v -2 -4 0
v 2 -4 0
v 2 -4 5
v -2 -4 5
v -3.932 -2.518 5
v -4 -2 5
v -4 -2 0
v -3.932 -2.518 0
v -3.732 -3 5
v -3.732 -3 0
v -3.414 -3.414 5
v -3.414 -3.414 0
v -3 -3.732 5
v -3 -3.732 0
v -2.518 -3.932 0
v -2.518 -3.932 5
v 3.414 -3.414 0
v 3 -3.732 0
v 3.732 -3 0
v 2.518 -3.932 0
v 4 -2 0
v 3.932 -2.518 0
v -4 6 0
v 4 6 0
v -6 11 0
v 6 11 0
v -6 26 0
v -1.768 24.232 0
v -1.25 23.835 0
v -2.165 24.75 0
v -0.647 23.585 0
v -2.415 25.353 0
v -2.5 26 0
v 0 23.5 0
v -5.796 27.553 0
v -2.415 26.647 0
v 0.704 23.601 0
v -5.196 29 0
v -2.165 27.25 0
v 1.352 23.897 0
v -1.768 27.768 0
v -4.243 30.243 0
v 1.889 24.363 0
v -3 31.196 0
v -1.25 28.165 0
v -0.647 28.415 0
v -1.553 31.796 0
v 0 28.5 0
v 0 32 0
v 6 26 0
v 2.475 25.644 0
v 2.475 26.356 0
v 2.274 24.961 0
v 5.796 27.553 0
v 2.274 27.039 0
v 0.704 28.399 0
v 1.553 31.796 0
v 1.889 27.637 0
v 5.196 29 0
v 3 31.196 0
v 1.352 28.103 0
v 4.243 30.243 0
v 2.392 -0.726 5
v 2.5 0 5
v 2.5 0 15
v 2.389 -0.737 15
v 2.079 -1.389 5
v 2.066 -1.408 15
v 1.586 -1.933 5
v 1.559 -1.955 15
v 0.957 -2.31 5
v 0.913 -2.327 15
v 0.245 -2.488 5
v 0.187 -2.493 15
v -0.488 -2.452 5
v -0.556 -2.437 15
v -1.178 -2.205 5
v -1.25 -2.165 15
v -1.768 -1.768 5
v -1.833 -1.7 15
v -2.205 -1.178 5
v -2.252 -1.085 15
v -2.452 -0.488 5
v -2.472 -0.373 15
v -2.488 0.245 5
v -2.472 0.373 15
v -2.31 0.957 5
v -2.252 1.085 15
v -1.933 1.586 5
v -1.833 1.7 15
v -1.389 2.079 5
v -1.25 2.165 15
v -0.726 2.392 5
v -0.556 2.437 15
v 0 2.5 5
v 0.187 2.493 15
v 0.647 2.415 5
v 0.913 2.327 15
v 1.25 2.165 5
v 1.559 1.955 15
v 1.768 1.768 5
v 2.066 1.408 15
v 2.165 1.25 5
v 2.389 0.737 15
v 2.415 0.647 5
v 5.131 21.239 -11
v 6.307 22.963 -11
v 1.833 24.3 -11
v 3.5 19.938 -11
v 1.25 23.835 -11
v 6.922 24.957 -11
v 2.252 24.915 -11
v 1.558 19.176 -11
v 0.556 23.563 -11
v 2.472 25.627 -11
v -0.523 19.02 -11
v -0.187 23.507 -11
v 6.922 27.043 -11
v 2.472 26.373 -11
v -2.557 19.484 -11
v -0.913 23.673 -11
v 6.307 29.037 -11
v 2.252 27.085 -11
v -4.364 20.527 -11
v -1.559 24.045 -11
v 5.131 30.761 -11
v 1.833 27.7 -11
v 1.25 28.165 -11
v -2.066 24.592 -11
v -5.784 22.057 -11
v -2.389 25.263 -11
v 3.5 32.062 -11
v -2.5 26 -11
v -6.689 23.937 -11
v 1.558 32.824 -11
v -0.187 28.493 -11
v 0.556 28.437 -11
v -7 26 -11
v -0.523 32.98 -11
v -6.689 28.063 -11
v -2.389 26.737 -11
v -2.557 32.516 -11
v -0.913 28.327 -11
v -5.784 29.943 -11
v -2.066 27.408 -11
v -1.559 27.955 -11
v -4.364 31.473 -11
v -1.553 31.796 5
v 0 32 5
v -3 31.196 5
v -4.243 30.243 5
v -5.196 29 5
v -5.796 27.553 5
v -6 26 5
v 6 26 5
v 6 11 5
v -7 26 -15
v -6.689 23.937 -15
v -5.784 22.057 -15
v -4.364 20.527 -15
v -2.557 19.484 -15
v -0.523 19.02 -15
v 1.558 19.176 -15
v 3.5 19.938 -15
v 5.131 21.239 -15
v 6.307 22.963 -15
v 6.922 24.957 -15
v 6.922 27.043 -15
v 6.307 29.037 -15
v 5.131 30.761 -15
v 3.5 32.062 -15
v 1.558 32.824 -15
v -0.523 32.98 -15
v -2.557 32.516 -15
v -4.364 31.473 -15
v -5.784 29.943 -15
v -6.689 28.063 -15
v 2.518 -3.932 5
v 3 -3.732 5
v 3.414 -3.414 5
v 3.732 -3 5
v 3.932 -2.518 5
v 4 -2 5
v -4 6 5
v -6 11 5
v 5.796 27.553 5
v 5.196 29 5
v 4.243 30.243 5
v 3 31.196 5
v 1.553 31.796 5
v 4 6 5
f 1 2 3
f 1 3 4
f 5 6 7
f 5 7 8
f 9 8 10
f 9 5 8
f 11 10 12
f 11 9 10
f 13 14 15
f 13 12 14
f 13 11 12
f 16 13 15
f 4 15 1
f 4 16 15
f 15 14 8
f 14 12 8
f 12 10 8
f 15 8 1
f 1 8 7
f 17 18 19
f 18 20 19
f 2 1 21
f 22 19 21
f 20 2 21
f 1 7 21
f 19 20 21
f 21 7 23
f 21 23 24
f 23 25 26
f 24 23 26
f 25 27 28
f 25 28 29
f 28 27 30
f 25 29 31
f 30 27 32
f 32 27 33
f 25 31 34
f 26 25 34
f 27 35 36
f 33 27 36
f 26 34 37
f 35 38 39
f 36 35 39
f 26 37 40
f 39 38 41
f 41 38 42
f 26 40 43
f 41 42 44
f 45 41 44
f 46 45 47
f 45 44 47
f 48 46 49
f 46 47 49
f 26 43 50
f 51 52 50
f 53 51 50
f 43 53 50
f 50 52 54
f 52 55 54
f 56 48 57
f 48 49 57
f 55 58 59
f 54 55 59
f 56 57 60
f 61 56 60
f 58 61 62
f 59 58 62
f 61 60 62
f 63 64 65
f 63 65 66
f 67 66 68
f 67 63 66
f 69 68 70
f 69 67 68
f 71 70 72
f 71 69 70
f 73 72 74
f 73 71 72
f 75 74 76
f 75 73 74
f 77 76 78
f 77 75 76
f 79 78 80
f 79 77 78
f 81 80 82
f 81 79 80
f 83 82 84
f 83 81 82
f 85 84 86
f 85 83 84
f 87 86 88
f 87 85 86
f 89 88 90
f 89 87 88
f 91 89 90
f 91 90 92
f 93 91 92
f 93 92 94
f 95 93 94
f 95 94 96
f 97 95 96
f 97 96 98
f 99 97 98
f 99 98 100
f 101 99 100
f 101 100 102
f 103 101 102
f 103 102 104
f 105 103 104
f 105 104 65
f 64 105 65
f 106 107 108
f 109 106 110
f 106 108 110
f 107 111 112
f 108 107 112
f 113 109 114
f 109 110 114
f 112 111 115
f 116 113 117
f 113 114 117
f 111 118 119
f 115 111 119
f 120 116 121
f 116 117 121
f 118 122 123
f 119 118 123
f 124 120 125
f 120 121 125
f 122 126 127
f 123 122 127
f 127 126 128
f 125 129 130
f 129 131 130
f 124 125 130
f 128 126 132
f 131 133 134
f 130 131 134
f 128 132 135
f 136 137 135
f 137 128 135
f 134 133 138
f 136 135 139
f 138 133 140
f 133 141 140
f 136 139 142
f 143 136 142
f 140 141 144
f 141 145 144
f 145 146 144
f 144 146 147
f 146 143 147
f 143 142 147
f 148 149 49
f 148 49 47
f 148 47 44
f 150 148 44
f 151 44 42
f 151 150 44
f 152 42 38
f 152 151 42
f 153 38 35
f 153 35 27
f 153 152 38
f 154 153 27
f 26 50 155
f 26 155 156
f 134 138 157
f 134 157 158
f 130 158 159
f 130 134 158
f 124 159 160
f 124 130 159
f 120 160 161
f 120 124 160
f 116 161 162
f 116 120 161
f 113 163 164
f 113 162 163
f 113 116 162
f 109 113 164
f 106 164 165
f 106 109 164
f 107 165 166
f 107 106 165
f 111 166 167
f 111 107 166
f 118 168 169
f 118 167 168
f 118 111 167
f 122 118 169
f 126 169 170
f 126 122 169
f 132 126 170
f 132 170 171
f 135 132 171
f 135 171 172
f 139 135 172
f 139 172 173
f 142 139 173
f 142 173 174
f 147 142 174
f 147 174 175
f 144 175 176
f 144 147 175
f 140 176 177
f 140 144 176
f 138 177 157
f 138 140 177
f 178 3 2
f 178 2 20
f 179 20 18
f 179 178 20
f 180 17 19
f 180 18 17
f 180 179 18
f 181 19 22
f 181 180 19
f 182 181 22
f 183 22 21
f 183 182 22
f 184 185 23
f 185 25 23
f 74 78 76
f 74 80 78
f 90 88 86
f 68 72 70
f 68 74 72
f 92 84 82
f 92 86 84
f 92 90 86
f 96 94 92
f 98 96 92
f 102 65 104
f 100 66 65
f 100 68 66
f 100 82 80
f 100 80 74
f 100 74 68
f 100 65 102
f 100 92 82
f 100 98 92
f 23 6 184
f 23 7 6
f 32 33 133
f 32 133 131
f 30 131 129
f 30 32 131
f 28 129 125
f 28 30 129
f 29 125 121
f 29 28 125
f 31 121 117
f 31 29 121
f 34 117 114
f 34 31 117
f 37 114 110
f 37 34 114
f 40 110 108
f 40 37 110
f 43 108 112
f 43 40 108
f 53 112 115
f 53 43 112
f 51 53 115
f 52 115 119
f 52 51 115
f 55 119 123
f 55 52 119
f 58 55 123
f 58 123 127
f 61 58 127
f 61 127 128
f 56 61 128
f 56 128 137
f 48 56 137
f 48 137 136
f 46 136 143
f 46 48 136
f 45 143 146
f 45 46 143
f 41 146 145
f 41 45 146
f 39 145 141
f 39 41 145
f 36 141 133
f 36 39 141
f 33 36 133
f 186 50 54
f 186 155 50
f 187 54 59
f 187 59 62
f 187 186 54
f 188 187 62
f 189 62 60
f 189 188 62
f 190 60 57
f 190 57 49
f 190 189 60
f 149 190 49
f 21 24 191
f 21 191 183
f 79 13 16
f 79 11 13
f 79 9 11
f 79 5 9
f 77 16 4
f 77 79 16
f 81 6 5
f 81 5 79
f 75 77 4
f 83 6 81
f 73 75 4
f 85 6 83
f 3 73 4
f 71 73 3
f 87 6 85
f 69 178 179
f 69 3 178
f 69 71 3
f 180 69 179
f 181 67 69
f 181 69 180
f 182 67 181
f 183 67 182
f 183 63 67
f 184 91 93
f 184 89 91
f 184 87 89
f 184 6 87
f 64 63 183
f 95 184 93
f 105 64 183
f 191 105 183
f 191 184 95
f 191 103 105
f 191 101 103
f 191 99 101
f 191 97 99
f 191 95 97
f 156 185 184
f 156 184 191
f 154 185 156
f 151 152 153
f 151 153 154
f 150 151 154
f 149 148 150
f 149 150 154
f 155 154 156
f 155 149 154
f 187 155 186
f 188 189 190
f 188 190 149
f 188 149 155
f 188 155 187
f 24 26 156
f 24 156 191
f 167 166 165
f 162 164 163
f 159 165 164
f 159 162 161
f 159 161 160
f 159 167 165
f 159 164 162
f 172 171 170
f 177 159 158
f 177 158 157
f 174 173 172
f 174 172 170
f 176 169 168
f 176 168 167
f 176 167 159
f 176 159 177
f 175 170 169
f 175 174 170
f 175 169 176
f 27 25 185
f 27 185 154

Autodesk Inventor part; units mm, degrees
ref_plane "YZ Plane" through (0, 0, 0) normal (1, 0, 0) x (0, 1, 0)
ref_plane "XZ Plane" through (0, 0, 0) normal (0, 1, 0) x (-1, 0, 0)
ref_plane "XY Plane" through (0, 0, 0) normal (0, 0, 1) x (1, 0, 0)
sketch "스케치1" plane through (0, 0, 0) normal (0, 0, 1) x (1, 0, 0)
  circle A0 centre (0, 0) radius 2.5
  line L0 (0, 0) -> (0, 40)
  line L1 (4, 6) -> (4, -4)
  line L2 (4, -4) -> (-4, -4)
  line L3 (-4, -4) -> (-4, 6)
  line L4 (-6, 32) -> (6, 32)
  line L5 (6, 32) -> (6, 11)
  line L6 (-6, 11) -> (-6, 32)
  line L7 (-6, 11) -> (-4, 6)
  line L8 (6, 11) -> (4, 6)
  dimension "d0" = 5
  dimension "d1" = 40
  dimension "d2" = 8
  dimension "d3" = 4
  dimension "d4" = 4
  dimension "d5" = 36
  dimension "d8" = 12
  dimension "d9" = 6
  dimension "d10" = 10
  dimension "d11" = 5
  dimension "d12" = 5
  dimension "d13" = 10
extrude "돌출1" add sketch "스케치1" along normal blind 5
extrude "돌출2" add sketch "스케치1" along normal blind 15 contours A0
sketch "스케치2" plane through (0, 0, 0) normal (0, 0, -1) x (-1, 0, 0)
  circle A0 centre (0, 26) radius 2.5
  line L0 (-6, 11) -> (-6, 32) projected
  line L1 (4, -4) -> (-4, -4) projected
  point P0 (0, 0)
  dimension "d18" = 5
  dimension "d19" = 6
  dimension "d20" = 30
extrude "돌출3" add sketch "스케치2" along normal blind 11
sketch "스케치3" plane through (0, 26, -11) normal (0, 0, -1) x (-1, 0, 0)
  circle A0 centre (0, 0) radius 7
  point P0 (0, -26)
  dimension "d23" = 14
extrude "돌출4" add sketch "스케치3" along normal blind 4
fillet "모깎기1" radius 2 2 edges at (-4, -4, 2.5) (4, -4, 2.5)
fillet "모깎기2" radius 6 2 edges at (6, 32, 2.5) (-6, 32, 2.5)
properties part number "2번부품"
